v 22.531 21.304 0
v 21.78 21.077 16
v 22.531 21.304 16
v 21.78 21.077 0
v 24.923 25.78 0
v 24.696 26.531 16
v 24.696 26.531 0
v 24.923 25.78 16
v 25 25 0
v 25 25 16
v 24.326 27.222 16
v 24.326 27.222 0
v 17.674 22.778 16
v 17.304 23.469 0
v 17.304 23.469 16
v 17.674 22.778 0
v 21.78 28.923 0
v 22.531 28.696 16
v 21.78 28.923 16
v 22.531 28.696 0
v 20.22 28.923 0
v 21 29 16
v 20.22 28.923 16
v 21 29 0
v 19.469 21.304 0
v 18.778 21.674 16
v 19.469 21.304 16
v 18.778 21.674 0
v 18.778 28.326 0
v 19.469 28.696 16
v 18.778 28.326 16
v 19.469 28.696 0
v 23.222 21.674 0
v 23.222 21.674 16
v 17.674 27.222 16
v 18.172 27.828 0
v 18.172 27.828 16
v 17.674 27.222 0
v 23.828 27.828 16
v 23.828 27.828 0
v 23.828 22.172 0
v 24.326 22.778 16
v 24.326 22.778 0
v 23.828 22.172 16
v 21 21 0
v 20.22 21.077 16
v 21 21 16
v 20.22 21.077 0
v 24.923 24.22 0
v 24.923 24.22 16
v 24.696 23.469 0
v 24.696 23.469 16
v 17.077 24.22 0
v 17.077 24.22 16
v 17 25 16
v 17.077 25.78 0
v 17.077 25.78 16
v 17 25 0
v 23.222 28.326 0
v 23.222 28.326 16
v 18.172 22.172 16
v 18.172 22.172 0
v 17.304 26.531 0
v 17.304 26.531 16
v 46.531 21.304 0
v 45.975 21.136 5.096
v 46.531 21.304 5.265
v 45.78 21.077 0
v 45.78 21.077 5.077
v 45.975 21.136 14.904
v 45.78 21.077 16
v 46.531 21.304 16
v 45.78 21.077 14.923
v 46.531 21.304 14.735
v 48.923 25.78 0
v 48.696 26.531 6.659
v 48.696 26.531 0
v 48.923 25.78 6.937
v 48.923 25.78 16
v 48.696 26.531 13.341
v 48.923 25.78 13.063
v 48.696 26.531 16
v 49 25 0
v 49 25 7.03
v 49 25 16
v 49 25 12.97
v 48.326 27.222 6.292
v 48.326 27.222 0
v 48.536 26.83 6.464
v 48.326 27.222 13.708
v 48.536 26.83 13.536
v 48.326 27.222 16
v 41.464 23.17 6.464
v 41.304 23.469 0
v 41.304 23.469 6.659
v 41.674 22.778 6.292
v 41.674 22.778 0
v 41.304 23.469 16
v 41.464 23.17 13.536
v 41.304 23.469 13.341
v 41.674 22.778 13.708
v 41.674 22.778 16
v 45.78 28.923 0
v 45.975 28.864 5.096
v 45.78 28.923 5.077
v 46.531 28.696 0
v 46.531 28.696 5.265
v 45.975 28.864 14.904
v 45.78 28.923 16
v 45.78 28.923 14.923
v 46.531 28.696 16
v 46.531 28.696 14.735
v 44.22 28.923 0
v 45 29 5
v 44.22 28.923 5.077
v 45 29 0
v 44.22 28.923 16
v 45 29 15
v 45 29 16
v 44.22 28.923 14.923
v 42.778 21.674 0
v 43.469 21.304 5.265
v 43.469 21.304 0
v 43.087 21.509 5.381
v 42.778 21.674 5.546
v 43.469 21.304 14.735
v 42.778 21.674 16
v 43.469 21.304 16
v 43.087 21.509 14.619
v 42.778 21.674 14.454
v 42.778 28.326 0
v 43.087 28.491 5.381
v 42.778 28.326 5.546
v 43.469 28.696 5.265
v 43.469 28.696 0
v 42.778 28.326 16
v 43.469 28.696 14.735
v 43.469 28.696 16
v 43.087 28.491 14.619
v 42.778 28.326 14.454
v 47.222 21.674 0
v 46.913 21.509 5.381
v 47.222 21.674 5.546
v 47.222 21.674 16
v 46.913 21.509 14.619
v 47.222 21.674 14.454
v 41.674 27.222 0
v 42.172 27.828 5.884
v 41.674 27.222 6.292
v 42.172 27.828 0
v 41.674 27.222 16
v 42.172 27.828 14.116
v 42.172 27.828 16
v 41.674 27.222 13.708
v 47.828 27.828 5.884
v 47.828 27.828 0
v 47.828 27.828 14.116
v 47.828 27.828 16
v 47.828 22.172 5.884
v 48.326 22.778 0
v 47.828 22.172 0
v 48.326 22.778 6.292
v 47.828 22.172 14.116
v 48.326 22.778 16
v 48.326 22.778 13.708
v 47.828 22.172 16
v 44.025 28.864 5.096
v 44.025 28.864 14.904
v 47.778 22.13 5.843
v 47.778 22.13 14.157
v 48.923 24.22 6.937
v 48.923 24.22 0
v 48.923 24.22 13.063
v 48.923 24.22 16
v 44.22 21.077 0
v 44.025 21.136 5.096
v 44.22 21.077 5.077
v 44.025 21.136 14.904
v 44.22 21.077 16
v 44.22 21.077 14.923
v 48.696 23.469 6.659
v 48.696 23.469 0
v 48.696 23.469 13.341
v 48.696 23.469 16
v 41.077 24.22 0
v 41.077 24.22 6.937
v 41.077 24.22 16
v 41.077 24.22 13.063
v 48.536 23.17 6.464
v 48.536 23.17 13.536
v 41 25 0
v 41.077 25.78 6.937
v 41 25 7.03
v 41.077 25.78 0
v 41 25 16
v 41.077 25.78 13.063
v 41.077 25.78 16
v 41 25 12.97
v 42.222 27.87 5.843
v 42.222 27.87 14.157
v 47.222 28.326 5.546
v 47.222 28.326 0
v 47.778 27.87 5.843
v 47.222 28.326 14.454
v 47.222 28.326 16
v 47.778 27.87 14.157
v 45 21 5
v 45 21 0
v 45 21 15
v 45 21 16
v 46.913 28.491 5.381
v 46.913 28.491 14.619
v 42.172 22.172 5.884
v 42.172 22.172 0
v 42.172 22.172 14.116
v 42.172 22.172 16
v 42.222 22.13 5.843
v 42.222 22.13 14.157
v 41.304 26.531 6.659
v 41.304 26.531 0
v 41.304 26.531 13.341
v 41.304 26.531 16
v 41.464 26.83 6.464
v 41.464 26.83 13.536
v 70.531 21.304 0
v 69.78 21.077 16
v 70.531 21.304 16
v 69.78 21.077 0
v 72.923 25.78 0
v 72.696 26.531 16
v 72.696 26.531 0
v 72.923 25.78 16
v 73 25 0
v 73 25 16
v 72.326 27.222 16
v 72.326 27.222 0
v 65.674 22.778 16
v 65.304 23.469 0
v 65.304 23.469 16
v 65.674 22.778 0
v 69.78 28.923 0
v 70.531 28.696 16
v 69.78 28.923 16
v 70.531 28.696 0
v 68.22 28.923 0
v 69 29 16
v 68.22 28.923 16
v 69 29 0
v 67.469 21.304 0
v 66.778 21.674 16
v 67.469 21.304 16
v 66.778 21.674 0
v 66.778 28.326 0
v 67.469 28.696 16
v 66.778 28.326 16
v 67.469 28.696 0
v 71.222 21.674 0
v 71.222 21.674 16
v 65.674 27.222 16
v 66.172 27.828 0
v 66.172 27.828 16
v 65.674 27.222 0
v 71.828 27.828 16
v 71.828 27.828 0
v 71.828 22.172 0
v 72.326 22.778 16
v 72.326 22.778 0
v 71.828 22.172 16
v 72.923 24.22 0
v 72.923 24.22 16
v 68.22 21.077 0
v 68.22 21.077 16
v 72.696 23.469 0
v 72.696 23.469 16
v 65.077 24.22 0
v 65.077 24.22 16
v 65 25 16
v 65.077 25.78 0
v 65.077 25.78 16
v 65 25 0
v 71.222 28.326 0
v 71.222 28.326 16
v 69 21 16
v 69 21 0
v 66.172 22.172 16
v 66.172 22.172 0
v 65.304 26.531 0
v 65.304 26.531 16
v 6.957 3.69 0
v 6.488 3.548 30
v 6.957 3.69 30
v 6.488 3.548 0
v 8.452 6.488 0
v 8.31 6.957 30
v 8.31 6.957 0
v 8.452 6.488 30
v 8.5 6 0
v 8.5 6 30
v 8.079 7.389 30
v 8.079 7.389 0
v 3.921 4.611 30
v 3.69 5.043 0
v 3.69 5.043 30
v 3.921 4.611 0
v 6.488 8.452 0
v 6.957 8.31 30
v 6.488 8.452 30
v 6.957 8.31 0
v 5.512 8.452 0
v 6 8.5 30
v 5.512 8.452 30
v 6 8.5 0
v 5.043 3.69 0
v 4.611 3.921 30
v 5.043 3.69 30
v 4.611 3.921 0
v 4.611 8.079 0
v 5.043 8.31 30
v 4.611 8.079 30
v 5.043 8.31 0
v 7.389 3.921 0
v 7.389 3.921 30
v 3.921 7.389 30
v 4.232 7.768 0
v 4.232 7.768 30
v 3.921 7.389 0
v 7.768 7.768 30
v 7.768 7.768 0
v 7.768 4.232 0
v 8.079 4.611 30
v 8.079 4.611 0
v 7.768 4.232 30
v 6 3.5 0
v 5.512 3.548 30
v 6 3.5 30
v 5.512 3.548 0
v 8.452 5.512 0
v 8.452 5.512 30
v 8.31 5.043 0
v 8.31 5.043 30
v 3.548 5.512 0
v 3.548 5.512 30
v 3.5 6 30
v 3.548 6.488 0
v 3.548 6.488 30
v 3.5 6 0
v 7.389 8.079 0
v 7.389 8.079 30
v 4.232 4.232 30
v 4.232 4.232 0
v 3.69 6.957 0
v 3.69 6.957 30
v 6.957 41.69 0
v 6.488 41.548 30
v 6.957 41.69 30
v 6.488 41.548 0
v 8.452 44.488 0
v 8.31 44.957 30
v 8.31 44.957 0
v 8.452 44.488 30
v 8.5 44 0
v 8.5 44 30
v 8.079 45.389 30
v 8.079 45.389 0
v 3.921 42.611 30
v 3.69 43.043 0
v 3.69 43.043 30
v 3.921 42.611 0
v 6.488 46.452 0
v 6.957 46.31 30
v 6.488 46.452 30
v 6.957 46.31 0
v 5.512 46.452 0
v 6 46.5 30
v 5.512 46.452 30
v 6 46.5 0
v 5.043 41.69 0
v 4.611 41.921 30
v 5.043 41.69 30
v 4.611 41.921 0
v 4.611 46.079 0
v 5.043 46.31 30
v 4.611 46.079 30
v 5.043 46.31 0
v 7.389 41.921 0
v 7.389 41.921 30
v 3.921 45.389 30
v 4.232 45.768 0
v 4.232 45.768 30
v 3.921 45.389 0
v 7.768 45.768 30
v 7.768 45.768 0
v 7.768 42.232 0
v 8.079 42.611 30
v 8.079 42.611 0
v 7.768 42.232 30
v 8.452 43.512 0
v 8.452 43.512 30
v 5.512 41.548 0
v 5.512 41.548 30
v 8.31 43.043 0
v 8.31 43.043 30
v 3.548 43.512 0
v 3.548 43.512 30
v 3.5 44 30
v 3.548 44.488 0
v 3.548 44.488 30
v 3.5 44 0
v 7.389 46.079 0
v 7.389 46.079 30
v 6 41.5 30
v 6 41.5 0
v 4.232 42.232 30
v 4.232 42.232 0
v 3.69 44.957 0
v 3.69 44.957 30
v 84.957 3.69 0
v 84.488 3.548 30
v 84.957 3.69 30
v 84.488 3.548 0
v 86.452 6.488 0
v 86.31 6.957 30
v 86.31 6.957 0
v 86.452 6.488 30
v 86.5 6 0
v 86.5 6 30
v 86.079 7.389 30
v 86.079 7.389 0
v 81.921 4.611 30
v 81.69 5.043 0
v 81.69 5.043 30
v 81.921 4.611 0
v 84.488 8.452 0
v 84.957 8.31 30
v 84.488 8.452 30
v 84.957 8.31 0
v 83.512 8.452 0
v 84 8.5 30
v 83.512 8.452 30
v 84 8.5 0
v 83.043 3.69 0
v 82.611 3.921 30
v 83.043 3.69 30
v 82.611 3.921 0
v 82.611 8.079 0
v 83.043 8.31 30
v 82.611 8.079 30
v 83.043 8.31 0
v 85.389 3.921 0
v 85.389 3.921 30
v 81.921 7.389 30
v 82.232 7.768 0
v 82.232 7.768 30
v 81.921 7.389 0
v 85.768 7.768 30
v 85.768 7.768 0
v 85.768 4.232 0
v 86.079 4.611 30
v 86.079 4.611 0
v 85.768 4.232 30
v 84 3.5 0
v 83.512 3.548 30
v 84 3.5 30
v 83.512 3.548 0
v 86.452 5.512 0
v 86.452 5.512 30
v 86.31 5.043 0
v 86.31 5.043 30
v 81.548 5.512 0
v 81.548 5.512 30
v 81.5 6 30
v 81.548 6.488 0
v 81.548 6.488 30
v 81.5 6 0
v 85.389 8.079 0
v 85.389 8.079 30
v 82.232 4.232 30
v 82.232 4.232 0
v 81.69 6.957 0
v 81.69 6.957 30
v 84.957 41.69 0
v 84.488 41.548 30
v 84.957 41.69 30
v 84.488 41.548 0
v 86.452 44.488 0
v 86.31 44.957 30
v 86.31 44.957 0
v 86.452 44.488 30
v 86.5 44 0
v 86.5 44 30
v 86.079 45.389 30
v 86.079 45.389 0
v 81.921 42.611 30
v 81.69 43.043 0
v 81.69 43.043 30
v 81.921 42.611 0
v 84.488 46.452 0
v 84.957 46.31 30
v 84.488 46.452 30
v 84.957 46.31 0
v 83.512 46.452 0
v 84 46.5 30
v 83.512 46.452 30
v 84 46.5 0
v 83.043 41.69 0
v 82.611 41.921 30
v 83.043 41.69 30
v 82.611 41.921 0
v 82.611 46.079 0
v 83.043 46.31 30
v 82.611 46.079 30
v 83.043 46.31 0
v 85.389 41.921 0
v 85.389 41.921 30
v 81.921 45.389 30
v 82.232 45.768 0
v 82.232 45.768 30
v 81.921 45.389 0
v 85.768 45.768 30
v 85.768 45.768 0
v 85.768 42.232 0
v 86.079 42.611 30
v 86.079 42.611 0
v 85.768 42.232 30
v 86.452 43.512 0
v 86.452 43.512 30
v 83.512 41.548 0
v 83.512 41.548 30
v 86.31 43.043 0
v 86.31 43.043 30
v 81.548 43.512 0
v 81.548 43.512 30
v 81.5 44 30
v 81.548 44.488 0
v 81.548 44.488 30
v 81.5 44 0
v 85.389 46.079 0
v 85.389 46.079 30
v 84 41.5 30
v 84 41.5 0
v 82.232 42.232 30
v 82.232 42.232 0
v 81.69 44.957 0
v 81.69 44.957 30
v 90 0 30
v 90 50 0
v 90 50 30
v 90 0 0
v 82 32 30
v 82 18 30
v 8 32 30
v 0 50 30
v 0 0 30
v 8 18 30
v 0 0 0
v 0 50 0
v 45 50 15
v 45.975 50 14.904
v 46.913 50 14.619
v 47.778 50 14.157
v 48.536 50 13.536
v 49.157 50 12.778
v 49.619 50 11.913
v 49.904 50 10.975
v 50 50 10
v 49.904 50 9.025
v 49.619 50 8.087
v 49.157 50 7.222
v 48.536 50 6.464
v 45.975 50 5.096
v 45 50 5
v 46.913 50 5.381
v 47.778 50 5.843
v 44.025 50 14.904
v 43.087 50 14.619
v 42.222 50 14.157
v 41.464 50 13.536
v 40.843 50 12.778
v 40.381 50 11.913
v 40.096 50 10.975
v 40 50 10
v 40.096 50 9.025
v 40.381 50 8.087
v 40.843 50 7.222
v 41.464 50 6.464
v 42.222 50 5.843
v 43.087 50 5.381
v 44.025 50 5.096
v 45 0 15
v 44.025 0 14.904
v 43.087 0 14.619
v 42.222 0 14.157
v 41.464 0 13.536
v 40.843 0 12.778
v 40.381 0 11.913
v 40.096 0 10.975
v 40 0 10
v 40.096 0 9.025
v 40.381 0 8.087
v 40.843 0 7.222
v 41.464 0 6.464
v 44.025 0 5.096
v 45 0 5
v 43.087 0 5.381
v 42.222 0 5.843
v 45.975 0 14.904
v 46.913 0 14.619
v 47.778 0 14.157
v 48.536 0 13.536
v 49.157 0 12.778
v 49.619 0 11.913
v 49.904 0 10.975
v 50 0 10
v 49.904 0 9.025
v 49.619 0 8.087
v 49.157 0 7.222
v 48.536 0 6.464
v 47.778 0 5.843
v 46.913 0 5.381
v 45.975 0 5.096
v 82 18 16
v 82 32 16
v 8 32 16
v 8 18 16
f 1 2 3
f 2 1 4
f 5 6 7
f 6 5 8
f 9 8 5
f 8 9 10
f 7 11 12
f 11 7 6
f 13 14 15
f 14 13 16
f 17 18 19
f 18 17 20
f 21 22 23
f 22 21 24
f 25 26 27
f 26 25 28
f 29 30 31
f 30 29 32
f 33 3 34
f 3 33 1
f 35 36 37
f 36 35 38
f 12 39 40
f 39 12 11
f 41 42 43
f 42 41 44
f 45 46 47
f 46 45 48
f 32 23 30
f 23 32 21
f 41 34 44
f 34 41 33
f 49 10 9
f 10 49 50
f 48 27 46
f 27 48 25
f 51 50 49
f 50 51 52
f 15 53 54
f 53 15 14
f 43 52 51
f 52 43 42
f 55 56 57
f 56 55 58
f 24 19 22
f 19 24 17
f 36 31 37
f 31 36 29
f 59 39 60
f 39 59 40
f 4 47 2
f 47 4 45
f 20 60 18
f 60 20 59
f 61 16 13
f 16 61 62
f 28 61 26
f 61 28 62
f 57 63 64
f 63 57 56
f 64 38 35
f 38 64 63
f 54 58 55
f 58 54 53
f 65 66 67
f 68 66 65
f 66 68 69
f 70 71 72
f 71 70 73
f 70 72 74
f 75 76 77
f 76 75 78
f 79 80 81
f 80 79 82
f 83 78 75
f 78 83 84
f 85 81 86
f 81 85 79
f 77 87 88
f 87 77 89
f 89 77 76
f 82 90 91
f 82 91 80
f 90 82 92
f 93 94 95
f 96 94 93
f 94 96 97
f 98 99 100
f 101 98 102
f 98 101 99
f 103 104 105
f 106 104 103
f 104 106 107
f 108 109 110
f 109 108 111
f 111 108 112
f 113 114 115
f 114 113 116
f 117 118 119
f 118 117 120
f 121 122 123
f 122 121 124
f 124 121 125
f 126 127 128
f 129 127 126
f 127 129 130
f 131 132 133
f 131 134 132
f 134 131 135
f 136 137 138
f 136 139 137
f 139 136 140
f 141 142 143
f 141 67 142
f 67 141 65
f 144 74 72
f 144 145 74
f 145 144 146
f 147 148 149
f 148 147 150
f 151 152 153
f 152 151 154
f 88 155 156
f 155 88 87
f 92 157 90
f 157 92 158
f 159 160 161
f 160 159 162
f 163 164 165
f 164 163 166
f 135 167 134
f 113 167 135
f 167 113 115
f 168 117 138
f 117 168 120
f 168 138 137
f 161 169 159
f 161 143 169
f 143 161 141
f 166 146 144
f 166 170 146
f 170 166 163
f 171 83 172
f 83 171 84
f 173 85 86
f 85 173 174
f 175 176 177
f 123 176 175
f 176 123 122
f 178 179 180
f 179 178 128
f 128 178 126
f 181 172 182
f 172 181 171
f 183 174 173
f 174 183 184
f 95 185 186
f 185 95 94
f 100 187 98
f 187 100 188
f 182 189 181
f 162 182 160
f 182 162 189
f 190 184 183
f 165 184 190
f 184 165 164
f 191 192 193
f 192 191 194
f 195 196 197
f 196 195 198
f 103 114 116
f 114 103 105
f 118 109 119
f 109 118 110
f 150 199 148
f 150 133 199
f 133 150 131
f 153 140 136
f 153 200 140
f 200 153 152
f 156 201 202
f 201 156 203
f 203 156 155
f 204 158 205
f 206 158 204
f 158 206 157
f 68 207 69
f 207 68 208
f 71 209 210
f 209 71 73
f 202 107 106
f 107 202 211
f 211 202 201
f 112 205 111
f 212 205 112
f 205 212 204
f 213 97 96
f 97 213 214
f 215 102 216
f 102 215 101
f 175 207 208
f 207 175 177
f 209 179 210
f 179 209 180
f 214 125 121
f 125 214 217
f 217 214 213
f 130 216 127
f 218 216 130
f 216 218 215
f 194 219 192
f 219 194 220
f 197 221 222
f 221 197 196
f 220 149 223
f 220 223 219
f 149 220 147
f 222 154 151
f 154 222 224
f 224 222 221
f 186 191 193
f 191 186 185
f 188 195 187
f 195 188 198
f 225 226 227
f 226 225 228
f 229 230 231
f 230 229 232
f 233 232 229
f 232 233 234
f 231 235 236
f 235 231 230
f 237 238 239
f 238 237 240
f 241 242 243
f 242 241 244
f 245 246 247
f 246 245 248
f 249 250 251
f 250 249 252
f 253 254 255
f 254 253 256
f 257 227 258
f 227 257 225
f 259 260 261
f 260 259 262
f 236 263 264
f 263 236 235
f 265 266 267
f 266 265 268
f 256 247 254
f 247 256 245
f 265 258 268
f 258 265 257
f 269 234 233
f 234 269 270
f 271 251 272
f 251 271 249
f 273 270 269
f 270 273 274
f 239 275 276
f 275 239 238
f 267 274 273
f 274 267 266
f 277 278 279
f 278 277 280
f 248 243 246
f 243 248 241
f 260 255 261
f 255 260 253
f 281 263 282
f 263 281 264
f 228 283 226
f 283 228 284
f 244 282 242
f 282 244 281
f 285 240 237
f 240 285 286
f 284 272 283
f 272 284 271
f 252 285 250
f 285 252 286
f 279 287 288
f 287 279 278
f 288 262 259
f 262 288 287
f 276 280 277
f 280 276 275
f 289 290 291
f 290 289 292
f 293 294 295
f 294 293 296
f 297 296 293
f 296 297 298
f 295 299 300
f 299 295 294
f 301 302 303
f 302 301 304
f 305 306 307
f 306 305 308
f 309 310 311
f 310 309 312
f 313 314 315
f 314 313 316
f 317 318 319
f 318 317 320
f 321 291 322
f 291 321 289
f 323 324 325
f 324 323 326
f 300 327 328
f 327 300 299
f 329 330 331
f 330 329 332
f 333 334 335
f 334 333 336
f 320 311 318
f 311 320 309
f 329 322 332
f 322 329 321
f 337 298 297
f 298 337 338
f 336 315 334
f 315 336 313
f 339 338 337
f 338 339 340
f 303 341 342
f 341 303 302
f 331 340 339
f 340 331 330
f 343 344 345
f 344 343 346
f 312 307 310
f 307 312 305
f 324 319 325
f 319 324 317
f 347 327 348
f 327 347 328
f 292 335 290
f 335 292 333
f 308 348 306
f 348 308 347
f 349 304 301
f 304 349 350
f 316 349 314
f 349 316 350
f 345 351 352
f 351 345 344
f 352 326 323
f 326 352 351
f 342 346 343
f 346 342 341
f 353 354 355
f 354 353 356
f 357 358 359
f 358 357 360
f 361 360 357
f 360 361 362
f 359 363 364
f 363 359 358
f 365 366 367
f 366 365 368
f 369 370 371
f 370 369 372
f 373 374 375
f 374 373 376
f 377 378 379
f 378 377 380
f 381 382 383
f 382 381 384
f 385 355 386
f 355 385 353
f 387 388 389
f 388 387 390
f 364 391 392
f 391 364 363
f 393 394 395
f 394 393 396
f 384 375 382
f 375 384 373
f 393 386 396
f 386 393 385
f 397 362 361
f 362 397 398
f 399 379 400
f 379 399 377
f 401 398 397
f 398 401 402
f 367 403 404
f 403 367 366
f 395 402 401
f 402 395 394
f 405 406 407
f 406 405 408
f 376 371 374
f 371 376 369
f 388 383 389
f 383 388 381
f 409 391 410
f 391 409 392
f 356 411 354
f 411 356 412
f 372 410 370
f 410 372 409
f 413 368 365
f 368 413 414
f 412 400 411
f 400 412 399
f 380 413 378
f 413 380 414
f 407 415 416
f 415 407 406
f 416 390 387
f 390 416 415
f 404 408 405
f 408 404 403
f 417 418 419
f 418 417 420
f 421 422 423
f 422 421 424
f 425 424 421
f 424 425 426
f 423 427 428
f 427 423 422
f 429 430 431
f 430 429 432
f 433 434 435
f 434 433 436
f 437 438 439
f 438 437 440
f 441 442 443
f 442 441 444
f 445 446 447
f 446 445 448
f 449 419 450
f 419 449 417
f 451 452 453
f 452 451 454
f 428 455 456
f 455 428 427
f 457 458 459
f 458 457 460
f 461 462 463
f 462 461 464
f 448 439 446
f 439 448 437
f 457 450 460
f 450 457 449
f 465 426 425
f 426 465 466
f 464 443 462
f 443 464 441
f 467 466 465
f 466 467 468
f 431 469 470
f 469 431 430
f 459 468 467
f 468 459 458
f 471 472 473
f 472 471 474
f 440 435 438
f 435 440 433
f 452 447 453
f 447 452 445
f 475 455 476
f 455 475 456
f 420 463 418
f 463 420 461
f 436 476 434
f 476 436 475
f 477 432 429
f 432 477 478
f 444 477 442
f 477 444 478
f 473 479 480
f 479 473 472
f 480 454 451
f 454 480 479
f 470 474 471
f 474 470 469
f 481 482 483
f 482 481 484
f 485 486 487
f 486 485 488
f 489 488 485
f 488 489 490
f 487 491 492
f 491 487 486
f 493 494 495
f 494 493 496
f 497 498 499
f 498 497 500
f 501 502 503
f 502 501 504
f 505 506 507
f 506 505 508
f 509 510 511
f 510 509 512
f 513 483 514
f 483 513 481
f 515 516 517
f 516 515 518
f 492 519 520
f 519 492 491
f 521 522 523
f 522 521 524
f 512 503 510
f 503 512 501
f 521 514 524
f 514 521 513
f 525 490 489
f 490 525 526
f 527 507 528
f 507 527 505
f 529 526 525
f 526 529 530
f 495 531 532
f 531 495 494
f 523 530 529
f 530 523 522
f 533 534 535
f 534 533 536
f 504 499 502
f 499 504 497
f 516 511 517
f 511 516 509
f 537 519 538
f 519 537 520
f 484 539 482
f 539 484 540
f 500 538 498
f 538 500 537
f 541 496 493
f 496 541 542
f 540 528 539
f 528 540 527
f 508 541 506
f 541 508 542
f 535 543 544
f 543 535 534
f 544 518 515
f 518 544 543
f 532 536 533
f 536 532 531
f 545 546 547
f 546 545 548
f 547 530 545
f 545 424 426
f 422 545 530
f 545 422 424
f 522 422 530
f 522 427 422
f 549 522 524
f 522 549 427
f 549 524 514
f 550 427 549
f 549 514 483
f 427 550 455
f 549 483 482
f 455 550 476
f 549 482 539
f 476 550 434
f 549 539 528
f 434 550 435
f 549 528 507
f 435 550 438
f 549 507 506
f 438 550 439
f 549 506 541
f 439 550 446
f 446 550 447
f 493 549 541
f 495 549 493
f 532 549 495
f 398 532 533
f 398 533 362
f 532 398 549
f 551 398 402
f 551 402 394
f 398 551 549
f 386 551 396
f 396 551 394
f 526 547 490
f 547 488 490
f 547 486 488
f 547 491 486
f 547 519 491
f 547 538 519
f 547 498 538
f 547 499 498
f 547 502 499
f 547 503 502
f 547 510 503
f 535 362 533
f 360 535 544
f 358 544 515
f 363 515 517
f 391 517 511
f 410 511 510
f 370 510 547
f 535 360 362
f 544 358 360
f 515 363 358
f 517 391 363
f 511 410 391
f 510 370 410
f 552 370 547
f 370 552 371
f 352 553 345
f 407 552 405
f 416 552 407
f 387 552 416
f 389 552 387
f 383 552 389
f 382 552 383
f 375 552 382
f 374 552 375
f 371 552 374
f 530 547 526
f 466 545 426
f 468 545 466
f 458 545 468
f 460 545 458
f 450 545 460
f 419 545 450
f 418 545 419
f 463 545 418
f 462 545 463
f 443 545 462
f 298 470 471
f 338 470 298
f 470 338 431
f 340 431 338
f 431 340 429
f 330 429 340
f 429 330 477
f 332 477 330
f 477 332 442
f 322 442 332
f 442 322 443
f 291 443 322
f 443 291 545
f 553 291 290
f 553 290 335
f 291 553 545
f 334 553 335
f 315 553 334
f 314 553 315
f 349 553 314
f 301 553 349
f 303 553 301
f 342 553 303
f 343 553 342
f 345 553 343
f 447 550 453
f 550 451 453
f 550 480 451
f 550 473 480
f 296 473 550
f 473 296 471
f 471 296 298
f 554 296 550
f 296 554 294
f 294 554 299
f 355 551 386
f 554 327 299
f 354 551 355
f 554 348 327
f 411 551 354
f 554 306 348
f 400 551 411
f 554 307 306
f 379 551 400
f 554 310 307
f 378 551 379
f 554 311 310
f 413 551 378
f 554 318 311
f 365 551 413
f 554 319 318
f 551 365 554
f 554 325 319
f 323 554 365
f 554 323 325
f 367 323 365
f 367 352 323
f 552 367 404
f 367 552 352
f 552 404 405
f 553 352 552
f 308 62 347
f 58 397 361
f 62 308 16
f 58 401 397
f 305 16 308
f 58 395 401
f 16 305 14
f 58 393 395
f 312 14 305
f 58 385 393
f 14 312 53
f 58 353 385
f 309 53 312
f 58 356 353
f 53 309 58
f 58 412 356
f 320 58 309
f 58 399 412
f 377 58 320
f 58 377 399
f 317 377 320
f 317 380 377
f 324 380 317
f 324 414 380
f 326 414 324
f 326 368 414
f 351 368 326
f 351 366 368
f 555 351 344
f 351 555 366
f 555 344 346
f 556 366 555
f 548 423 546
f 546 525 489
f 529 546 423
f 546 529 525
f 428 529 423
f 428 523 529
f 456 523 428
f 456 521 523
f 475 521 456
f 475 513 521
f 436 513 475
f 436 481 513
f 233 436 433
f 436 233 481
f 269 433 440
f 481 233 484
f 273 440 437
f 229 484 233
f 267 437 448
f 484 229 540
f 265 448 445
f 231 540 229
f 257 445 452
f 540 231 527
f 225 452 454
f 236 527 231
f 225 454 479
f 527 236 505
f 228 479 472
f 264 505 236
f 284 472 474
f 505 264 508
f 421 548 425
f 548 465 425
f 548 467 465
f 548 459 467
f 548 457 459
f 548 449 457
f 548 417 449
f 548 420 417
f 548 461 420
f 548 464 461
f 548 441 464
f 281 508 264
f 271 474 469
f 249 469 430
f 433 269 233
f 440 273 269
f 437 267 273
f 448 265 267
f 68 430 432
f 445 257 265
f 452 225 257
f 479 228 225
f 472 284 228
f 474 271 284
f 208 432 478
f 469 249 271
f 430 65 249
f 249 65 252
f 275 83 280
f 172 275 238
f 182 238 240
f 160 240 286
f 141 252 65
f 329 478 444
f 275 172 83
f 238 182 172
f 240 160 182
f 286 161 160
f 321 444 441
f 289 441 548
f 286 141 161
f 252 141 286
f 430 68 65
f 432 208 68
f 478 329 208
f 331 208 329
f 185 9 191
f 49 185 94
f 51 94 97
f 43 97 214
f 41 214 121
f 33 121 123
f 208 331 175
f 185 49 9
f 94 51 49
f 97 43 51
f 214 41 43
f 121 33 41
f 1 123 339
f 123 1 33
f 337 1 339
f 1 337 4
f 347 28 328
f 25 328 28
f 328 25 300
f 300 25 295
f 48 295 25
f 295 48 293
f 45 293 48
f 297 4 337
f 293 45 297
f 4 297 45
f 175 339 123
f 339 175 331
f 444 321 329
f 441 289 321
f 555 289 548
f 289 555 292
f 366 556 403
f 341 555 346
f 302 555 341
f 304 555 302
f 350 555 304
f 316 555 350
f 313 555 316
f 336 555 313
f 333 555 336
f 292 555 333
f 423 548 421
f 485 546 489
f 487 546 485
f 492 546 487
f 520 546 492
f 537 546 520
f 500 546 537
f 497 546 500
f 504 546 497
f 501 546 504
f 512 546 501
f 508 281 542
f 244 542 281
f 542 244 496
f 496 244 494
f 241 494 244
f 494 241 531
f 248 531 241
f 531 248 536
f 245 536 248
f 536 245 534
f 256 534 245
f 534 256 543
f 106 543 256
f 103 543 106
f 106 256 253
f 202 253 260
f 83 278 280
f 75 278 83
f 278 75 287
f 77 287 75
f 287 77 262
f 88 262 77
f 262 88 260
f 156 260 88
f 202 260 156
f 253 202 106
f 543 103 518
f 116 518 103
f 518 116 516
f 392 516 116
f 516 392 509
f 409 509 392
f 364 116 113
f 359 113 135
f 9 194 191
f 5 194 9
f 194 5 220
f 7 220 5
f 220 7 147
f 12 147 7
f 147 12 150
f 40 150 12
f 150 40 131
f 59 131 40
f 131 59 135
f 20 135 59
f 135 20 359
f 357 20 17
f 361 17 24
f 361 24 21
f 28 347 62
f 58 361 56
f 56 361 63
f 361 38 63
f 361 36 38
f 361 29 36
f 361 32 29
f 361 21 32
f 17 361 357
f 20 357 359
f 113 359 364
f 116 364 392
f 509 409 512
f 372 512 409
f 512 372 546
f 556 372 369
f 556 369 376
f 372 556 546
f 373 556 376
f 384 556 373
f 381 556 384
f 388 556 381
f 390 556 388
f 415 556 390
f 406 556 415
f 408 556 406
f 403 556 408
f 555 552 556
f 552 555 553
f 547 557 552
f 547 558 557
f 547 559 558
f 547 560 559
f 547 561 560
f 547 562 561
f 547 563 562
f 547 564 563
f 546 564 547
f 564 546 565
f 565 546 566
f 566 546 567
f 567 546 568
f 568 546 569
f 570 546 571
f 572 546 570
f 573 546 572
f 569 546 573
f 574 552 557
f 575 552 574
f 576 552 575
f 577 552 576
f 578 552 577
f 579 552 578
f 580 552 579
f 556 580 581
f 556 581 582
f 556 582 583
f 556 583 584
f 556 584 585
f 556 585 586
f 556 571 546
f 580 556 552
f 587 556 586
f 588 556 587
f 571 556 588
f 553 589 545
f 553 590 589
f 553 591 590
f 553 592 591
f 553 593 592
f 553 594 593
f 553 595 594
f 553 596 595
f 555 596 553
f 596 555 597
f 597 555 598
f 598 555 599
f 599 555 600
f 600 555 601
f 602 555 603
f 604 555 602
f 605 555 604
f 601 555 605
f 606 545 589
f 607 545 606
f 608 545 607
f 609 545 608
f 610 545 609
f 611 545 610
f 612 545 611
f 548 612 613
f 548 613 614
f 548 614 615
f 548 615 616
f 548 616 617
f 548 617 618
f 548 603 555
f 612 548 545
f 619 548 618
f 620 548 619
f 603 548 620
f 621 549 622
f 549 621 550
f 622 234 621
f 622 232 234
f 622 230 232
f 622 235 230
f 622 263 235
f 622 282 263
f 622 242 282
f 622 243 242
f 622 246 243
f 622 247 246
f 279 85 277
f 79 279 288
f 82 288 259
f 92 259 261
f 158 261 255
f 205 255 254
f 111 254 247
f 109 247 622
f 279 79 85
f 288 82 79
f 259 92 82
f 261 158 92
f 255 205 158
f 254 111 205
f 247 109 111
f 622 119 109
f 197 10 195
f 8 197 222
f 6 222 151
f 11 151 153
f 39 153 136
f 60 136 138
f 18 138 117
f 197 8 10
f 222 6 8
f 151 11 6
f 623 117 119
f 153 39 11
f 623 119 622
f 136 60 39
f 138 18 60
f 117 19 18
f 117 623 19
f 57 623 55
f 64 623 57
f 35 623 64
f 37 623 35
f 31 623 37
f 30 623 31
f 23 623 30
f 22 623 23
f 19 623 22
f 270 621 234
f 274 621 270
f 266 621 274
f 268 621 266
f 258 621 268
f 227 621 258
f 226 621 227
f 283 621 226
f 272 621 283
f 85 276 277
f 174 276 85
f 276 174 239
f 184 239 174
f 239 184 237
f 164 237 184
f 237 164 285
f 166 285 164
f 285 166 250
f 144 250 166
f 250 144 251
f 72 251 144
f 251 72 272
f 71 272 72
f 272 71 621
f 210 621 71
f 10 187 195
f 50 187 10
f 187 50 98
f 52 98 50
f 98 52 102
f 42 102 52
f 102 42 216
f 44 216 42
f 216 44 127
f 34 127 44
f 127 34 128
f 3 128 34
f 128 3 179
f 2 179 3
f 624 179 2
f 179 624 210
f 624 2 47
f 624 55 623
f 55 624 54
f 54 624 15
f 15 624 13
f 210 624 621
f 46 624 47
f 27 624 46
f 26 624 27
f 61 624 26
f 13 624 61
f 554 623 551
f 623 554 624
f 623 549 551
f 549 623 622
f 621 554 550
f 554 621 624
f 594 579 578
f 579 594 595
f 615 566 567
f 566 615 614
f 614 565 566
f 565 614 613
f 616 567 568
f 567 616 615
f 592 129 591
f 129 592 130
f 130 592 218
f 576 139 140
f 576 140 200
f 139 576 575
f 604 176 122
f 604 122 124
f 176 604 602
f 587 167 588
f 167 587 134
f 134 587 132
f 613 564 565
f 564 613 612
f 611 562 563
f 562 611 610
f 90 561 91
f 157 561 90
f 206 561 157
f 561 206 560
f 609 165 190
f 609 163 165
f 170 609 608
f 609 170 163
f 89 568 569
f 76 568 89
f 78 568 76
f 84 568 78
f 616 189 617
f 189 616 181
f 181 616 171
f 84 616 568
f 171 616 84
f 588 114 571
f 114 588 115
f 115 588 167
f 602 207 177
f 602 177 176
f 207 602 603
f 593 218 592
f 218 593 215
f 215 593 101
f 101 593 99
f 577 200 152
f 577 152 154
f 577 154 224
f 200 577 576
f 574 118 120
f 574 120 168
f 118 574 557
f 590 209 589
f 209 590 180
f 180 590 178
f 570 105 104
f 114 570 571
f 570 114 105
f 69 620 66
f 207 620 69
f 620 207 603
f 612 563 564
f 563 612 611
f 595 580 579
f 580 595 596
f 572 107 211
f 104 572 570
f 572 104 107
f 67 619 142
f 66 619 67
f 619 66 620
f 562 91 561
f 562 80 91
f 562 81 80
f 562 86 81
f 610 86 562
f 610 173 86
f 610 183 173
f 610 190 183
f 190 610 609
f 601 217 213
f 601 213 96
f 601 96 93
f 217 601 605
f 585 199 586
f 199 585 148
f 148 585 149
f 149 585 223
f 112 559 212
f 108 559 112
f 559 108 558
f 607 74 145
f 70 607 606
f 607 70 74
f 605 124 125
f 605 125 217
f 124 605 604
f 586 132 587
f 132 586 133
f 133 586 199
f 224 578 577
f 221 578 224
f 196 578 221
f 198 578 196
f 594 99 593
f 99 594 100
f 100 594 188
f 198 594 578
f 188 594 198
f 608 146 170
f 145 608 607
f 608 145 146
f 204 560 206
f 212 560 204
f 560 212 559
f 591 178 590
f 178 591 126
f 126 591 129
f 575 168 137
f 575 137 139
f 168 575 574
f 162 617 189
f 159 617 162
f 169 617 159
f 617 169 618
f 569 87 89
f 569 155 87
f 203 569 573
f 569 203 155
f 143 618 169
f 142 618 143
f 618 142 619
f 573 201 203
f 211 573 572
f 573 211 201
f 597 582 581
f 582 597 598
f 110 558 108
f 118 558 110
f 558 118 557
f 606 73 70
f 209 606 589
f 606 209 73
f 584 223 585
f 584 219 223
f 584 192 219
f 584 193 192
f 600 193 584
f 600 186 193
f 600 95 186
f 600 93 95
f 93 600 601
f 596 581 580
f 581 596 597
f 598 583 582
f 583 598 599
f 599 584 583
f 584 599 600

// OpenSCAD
$fn = 32;

// ----------------------------------------------------------------------
// Manifold block: side_outlet manifold
// ----------------------------------------------------------------------

// --- parameters (mm) ---
block_l = 90;             // block length, X
block_w = 50;             // block width, Y
block_h = 30;             // block height, Z
port_d = 8;               // port bore diameter
port_pitch = 24;          // port pitch along X
gallery_d = 14;           // top gallery width, Y
gallery_depth = 14;       // gallery pocket depth
wall_p = 8;               // gallery end wall thickness, X
mnt_d = 5;                // mounting hole diameter
mnt_in = 6;               // mounting hole inset from the edges
out_d = 10;               // outlet bore diameter
out_z = 10;               // outlet axis height
fit_tol = 0.1;            // tolerance for press fits, mm
free_tol = 0.5;           // tolerance for clearance fits, mm

n_ports = 3;  // ports in the row
port_x0 = (block_l - (n_ports - 1) * port_pitch) / 2;  // first port X

difference() {
  cube([block_l, block_w, block_h]);
  for (i = [0 : n_ports - 1])
    translate([port_x0 + i * port_pitch, block_w / 2, -1])
      cylinder(h = block_h + 2, d = port_d);
  translate([wall_p, block_w / 2 - gallery_d / 2, block_h - gallery_depth])
    cube([block_l - 2 * wall_p, gallery_d, gallery_depth + 1]);
  for (cx = [mnt_in, block_l - mnt_in])
    for (cy = [mnt_in, block_w - mnt_in])
      translate([cx, cy, -1]) cylinder(h = block_h + 2, d = mnt_d);
  translate([block_l / 2, -1, out_z]) rotate([-90, 0, 0])
    cylinder(h = block_w + 2, d = out_d);
}
